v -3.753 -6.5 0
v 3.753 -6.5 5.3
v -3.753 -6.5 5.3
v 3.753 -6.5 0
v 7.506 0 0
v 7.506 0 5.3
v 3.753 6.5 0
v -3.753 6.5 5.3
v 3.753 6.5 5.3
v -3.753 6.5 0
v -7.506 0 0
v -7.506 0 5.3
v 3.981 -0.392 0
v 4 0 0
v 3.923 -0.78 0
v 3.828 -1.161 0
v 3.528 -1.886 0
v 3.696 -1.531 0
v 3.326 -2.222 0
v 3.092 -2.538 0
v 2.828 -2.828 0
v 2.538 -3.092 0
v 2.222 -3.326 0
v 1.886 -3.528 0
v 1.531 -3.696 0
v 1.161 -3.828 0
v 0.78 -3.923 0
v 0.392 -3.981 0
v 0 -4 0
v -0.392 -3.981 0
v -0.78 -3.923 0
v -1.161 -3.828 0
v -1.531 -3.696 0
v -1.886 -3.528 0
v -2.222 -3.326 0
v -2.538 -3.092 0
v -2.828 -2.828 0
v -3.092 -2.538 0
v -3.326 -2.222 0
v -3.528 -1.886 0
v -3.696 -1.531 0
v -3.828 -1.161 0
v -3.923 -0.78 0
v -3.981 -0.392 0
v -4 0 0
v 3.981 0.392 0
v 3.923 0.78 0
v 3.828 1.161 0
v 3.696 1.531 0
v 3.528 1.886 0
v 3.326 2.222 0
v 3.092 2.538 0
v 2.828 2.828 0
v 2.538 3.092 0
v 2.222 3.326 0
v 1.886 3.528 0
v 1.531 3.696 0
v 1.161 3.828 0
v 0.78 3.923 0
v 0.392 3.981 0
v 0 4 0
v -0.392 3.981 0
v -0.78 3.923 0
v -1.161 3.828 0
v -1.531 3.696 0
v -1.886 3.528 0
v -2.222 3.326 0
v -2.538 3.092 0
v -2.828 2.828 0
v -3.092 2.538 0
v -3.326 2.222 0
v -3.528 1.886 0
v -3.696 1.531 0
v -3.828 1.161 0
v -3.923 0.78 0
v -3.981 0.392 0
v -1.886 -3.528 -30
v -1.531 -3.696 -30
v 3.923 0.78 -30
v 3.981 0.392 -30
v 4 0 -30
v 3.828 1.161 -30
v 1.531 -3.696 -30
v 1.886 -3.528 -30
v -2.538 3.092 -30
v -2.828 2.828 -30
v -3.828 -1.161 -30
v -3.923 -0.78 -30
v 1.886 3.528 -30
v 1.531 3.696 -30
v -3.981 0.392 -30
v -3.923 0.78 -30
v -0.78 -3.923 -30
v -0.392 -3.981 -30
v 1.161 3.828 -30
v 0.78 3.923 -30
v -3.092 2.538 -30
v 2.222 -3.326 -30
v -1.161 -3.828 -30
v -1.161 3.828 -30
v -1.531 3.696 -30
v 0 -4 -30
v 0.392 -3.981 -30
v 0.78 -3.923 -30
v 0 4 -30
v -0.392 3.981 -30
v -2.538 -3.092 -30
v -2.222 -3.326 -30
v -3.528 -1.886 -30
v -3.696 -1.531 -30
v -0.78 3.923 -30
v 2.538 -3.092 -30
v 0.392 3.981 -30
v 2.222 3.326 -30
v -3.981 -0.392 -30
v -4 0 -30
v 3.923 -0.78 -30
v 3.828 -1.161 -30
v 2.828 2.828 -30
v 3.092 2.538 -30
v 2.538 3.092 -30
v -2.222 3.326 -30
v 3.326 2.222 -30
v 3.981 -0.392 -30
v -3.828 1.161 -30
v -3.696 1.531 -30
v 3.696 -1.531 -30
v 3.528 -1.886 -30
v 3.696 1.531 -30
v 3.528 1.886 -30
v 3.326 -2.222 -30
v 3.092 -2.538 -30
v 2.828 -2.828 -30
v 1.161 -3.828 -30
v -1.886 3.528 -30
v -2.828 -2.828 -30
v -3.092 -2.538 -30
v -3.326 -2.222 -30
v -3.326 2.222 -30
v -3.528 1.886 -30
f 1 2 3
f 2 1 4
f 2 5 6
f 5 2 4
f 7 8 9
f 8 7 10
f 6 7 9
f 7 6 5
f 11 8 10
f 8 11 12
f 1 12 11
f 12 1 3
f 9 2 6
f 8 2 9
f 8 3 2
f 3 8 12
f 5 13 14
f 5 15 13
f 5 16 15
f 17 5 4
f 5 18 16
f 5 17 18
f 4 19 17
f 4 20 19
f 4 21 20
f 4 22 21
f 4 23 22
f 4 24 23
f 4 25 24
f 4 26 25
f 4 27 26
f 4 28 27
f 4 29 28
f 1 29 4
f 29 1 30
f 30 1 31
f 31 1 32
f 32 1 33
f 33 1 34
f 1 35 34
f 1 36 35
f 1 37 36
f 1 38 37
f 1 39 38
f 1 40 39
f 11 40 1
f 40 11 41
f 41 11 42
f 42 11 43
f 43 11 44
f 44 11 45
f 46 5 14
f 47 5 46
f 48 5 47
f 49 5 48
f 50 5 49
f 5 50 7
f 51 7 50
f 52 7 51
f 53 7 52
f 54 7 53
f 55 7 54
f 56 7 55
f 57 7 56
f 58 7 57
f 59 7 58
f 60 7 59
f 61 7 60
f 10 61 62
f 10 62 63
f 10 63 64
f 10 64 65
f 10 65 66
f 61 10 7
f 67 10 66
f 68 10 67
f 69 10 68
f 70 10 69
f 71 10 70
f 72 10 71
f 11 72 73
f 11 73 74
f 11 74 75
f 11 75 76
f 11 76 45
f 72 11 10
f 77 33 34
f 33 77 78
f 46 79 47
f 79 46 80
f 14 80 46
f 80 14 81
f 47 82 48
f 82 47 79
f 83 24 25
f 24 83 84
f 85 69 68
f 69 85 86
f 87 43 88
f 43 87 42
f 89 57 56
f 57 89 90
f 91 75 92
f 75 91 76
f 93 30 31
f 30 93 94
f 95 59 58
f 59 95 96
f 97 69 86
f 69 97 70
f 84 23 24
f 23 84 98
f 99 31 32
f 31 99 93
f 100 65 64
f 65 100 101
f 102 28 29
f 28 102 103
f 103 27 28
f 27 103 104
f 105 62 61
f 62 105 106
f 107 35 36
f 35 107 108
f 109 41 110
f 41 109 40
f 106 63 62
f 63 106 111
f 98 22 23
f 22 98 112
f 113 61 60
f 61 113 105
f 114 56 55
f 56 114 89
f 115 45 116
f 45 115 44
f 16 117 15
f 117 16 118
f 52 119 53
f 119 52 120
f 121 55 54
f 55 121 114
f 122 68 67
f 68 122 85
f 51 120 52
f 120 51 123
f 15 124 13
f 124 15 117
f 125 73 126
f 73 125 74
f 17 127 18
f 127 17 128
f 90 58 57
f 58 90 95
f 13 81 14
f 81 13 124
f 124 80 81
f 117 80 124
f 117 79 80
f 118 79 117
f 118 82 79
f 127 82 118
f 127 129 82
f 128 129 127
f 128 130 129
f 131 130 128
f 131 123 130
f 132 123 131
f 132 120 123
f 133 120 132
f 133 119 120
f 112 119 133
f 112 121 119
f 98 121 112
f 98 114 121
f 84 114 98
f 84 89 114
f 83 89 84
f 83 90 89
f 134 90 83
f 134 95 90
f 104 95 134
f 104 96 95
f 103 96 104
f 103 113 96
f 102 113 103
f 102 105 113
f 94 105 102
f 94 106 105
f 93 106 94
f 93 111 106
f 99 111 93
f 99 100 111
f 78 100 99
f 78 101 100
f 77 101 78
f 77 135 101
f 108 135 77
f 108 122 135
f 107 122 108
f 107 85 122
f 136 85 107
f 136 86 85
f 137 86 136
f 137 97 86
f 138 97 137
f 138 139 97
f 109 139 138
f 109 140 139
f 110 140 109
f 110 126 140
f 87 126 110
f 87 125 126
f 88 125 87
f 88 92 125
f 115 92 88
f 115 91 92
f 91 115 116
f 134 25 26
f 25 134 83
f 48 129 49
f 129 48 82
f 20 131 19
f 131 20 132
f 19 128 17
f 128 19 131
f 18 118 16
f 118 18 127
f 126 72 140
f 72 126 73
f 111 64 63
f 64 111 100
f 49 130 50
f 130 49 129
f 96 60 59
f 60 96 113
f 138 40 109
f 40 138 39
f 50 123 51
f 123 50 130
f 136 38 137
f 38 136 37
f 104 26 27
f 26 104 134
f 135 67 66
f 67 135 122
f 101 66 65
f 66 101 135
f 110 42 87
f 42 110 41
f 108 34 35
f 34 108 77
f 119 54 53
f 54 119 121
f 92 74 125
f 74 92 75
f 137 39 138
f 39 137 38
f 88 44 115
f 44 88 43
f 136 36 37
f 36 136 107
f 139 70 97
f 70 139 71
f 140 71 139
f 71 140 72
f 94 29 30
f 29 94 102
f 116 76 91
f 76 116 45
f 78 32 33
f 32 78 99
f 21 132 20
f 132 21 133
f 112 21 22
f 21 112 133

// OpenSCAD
$fn = 64;

module m8_hex_bolt() {
    union() {
        // Head: hexagonal prism, across-flats 13mm, height 5.3mm
        // Use cylinder with $fn=6; radius = AF / (2*cos(30))
        translate([0, 0, 0])
            cylinder(h = 5.3, r = 13 / (2 * cos(30)), $fn = 6);

        // Shank: cylindrical shaft, diameter 8mm, length 30mm
        // Head bottom at z=0, shank extends toward negative Z.
        translate([0, 0, -30])
            cylinder(h = 30, d = 8);
    }
}

m8_hex_bolt();
